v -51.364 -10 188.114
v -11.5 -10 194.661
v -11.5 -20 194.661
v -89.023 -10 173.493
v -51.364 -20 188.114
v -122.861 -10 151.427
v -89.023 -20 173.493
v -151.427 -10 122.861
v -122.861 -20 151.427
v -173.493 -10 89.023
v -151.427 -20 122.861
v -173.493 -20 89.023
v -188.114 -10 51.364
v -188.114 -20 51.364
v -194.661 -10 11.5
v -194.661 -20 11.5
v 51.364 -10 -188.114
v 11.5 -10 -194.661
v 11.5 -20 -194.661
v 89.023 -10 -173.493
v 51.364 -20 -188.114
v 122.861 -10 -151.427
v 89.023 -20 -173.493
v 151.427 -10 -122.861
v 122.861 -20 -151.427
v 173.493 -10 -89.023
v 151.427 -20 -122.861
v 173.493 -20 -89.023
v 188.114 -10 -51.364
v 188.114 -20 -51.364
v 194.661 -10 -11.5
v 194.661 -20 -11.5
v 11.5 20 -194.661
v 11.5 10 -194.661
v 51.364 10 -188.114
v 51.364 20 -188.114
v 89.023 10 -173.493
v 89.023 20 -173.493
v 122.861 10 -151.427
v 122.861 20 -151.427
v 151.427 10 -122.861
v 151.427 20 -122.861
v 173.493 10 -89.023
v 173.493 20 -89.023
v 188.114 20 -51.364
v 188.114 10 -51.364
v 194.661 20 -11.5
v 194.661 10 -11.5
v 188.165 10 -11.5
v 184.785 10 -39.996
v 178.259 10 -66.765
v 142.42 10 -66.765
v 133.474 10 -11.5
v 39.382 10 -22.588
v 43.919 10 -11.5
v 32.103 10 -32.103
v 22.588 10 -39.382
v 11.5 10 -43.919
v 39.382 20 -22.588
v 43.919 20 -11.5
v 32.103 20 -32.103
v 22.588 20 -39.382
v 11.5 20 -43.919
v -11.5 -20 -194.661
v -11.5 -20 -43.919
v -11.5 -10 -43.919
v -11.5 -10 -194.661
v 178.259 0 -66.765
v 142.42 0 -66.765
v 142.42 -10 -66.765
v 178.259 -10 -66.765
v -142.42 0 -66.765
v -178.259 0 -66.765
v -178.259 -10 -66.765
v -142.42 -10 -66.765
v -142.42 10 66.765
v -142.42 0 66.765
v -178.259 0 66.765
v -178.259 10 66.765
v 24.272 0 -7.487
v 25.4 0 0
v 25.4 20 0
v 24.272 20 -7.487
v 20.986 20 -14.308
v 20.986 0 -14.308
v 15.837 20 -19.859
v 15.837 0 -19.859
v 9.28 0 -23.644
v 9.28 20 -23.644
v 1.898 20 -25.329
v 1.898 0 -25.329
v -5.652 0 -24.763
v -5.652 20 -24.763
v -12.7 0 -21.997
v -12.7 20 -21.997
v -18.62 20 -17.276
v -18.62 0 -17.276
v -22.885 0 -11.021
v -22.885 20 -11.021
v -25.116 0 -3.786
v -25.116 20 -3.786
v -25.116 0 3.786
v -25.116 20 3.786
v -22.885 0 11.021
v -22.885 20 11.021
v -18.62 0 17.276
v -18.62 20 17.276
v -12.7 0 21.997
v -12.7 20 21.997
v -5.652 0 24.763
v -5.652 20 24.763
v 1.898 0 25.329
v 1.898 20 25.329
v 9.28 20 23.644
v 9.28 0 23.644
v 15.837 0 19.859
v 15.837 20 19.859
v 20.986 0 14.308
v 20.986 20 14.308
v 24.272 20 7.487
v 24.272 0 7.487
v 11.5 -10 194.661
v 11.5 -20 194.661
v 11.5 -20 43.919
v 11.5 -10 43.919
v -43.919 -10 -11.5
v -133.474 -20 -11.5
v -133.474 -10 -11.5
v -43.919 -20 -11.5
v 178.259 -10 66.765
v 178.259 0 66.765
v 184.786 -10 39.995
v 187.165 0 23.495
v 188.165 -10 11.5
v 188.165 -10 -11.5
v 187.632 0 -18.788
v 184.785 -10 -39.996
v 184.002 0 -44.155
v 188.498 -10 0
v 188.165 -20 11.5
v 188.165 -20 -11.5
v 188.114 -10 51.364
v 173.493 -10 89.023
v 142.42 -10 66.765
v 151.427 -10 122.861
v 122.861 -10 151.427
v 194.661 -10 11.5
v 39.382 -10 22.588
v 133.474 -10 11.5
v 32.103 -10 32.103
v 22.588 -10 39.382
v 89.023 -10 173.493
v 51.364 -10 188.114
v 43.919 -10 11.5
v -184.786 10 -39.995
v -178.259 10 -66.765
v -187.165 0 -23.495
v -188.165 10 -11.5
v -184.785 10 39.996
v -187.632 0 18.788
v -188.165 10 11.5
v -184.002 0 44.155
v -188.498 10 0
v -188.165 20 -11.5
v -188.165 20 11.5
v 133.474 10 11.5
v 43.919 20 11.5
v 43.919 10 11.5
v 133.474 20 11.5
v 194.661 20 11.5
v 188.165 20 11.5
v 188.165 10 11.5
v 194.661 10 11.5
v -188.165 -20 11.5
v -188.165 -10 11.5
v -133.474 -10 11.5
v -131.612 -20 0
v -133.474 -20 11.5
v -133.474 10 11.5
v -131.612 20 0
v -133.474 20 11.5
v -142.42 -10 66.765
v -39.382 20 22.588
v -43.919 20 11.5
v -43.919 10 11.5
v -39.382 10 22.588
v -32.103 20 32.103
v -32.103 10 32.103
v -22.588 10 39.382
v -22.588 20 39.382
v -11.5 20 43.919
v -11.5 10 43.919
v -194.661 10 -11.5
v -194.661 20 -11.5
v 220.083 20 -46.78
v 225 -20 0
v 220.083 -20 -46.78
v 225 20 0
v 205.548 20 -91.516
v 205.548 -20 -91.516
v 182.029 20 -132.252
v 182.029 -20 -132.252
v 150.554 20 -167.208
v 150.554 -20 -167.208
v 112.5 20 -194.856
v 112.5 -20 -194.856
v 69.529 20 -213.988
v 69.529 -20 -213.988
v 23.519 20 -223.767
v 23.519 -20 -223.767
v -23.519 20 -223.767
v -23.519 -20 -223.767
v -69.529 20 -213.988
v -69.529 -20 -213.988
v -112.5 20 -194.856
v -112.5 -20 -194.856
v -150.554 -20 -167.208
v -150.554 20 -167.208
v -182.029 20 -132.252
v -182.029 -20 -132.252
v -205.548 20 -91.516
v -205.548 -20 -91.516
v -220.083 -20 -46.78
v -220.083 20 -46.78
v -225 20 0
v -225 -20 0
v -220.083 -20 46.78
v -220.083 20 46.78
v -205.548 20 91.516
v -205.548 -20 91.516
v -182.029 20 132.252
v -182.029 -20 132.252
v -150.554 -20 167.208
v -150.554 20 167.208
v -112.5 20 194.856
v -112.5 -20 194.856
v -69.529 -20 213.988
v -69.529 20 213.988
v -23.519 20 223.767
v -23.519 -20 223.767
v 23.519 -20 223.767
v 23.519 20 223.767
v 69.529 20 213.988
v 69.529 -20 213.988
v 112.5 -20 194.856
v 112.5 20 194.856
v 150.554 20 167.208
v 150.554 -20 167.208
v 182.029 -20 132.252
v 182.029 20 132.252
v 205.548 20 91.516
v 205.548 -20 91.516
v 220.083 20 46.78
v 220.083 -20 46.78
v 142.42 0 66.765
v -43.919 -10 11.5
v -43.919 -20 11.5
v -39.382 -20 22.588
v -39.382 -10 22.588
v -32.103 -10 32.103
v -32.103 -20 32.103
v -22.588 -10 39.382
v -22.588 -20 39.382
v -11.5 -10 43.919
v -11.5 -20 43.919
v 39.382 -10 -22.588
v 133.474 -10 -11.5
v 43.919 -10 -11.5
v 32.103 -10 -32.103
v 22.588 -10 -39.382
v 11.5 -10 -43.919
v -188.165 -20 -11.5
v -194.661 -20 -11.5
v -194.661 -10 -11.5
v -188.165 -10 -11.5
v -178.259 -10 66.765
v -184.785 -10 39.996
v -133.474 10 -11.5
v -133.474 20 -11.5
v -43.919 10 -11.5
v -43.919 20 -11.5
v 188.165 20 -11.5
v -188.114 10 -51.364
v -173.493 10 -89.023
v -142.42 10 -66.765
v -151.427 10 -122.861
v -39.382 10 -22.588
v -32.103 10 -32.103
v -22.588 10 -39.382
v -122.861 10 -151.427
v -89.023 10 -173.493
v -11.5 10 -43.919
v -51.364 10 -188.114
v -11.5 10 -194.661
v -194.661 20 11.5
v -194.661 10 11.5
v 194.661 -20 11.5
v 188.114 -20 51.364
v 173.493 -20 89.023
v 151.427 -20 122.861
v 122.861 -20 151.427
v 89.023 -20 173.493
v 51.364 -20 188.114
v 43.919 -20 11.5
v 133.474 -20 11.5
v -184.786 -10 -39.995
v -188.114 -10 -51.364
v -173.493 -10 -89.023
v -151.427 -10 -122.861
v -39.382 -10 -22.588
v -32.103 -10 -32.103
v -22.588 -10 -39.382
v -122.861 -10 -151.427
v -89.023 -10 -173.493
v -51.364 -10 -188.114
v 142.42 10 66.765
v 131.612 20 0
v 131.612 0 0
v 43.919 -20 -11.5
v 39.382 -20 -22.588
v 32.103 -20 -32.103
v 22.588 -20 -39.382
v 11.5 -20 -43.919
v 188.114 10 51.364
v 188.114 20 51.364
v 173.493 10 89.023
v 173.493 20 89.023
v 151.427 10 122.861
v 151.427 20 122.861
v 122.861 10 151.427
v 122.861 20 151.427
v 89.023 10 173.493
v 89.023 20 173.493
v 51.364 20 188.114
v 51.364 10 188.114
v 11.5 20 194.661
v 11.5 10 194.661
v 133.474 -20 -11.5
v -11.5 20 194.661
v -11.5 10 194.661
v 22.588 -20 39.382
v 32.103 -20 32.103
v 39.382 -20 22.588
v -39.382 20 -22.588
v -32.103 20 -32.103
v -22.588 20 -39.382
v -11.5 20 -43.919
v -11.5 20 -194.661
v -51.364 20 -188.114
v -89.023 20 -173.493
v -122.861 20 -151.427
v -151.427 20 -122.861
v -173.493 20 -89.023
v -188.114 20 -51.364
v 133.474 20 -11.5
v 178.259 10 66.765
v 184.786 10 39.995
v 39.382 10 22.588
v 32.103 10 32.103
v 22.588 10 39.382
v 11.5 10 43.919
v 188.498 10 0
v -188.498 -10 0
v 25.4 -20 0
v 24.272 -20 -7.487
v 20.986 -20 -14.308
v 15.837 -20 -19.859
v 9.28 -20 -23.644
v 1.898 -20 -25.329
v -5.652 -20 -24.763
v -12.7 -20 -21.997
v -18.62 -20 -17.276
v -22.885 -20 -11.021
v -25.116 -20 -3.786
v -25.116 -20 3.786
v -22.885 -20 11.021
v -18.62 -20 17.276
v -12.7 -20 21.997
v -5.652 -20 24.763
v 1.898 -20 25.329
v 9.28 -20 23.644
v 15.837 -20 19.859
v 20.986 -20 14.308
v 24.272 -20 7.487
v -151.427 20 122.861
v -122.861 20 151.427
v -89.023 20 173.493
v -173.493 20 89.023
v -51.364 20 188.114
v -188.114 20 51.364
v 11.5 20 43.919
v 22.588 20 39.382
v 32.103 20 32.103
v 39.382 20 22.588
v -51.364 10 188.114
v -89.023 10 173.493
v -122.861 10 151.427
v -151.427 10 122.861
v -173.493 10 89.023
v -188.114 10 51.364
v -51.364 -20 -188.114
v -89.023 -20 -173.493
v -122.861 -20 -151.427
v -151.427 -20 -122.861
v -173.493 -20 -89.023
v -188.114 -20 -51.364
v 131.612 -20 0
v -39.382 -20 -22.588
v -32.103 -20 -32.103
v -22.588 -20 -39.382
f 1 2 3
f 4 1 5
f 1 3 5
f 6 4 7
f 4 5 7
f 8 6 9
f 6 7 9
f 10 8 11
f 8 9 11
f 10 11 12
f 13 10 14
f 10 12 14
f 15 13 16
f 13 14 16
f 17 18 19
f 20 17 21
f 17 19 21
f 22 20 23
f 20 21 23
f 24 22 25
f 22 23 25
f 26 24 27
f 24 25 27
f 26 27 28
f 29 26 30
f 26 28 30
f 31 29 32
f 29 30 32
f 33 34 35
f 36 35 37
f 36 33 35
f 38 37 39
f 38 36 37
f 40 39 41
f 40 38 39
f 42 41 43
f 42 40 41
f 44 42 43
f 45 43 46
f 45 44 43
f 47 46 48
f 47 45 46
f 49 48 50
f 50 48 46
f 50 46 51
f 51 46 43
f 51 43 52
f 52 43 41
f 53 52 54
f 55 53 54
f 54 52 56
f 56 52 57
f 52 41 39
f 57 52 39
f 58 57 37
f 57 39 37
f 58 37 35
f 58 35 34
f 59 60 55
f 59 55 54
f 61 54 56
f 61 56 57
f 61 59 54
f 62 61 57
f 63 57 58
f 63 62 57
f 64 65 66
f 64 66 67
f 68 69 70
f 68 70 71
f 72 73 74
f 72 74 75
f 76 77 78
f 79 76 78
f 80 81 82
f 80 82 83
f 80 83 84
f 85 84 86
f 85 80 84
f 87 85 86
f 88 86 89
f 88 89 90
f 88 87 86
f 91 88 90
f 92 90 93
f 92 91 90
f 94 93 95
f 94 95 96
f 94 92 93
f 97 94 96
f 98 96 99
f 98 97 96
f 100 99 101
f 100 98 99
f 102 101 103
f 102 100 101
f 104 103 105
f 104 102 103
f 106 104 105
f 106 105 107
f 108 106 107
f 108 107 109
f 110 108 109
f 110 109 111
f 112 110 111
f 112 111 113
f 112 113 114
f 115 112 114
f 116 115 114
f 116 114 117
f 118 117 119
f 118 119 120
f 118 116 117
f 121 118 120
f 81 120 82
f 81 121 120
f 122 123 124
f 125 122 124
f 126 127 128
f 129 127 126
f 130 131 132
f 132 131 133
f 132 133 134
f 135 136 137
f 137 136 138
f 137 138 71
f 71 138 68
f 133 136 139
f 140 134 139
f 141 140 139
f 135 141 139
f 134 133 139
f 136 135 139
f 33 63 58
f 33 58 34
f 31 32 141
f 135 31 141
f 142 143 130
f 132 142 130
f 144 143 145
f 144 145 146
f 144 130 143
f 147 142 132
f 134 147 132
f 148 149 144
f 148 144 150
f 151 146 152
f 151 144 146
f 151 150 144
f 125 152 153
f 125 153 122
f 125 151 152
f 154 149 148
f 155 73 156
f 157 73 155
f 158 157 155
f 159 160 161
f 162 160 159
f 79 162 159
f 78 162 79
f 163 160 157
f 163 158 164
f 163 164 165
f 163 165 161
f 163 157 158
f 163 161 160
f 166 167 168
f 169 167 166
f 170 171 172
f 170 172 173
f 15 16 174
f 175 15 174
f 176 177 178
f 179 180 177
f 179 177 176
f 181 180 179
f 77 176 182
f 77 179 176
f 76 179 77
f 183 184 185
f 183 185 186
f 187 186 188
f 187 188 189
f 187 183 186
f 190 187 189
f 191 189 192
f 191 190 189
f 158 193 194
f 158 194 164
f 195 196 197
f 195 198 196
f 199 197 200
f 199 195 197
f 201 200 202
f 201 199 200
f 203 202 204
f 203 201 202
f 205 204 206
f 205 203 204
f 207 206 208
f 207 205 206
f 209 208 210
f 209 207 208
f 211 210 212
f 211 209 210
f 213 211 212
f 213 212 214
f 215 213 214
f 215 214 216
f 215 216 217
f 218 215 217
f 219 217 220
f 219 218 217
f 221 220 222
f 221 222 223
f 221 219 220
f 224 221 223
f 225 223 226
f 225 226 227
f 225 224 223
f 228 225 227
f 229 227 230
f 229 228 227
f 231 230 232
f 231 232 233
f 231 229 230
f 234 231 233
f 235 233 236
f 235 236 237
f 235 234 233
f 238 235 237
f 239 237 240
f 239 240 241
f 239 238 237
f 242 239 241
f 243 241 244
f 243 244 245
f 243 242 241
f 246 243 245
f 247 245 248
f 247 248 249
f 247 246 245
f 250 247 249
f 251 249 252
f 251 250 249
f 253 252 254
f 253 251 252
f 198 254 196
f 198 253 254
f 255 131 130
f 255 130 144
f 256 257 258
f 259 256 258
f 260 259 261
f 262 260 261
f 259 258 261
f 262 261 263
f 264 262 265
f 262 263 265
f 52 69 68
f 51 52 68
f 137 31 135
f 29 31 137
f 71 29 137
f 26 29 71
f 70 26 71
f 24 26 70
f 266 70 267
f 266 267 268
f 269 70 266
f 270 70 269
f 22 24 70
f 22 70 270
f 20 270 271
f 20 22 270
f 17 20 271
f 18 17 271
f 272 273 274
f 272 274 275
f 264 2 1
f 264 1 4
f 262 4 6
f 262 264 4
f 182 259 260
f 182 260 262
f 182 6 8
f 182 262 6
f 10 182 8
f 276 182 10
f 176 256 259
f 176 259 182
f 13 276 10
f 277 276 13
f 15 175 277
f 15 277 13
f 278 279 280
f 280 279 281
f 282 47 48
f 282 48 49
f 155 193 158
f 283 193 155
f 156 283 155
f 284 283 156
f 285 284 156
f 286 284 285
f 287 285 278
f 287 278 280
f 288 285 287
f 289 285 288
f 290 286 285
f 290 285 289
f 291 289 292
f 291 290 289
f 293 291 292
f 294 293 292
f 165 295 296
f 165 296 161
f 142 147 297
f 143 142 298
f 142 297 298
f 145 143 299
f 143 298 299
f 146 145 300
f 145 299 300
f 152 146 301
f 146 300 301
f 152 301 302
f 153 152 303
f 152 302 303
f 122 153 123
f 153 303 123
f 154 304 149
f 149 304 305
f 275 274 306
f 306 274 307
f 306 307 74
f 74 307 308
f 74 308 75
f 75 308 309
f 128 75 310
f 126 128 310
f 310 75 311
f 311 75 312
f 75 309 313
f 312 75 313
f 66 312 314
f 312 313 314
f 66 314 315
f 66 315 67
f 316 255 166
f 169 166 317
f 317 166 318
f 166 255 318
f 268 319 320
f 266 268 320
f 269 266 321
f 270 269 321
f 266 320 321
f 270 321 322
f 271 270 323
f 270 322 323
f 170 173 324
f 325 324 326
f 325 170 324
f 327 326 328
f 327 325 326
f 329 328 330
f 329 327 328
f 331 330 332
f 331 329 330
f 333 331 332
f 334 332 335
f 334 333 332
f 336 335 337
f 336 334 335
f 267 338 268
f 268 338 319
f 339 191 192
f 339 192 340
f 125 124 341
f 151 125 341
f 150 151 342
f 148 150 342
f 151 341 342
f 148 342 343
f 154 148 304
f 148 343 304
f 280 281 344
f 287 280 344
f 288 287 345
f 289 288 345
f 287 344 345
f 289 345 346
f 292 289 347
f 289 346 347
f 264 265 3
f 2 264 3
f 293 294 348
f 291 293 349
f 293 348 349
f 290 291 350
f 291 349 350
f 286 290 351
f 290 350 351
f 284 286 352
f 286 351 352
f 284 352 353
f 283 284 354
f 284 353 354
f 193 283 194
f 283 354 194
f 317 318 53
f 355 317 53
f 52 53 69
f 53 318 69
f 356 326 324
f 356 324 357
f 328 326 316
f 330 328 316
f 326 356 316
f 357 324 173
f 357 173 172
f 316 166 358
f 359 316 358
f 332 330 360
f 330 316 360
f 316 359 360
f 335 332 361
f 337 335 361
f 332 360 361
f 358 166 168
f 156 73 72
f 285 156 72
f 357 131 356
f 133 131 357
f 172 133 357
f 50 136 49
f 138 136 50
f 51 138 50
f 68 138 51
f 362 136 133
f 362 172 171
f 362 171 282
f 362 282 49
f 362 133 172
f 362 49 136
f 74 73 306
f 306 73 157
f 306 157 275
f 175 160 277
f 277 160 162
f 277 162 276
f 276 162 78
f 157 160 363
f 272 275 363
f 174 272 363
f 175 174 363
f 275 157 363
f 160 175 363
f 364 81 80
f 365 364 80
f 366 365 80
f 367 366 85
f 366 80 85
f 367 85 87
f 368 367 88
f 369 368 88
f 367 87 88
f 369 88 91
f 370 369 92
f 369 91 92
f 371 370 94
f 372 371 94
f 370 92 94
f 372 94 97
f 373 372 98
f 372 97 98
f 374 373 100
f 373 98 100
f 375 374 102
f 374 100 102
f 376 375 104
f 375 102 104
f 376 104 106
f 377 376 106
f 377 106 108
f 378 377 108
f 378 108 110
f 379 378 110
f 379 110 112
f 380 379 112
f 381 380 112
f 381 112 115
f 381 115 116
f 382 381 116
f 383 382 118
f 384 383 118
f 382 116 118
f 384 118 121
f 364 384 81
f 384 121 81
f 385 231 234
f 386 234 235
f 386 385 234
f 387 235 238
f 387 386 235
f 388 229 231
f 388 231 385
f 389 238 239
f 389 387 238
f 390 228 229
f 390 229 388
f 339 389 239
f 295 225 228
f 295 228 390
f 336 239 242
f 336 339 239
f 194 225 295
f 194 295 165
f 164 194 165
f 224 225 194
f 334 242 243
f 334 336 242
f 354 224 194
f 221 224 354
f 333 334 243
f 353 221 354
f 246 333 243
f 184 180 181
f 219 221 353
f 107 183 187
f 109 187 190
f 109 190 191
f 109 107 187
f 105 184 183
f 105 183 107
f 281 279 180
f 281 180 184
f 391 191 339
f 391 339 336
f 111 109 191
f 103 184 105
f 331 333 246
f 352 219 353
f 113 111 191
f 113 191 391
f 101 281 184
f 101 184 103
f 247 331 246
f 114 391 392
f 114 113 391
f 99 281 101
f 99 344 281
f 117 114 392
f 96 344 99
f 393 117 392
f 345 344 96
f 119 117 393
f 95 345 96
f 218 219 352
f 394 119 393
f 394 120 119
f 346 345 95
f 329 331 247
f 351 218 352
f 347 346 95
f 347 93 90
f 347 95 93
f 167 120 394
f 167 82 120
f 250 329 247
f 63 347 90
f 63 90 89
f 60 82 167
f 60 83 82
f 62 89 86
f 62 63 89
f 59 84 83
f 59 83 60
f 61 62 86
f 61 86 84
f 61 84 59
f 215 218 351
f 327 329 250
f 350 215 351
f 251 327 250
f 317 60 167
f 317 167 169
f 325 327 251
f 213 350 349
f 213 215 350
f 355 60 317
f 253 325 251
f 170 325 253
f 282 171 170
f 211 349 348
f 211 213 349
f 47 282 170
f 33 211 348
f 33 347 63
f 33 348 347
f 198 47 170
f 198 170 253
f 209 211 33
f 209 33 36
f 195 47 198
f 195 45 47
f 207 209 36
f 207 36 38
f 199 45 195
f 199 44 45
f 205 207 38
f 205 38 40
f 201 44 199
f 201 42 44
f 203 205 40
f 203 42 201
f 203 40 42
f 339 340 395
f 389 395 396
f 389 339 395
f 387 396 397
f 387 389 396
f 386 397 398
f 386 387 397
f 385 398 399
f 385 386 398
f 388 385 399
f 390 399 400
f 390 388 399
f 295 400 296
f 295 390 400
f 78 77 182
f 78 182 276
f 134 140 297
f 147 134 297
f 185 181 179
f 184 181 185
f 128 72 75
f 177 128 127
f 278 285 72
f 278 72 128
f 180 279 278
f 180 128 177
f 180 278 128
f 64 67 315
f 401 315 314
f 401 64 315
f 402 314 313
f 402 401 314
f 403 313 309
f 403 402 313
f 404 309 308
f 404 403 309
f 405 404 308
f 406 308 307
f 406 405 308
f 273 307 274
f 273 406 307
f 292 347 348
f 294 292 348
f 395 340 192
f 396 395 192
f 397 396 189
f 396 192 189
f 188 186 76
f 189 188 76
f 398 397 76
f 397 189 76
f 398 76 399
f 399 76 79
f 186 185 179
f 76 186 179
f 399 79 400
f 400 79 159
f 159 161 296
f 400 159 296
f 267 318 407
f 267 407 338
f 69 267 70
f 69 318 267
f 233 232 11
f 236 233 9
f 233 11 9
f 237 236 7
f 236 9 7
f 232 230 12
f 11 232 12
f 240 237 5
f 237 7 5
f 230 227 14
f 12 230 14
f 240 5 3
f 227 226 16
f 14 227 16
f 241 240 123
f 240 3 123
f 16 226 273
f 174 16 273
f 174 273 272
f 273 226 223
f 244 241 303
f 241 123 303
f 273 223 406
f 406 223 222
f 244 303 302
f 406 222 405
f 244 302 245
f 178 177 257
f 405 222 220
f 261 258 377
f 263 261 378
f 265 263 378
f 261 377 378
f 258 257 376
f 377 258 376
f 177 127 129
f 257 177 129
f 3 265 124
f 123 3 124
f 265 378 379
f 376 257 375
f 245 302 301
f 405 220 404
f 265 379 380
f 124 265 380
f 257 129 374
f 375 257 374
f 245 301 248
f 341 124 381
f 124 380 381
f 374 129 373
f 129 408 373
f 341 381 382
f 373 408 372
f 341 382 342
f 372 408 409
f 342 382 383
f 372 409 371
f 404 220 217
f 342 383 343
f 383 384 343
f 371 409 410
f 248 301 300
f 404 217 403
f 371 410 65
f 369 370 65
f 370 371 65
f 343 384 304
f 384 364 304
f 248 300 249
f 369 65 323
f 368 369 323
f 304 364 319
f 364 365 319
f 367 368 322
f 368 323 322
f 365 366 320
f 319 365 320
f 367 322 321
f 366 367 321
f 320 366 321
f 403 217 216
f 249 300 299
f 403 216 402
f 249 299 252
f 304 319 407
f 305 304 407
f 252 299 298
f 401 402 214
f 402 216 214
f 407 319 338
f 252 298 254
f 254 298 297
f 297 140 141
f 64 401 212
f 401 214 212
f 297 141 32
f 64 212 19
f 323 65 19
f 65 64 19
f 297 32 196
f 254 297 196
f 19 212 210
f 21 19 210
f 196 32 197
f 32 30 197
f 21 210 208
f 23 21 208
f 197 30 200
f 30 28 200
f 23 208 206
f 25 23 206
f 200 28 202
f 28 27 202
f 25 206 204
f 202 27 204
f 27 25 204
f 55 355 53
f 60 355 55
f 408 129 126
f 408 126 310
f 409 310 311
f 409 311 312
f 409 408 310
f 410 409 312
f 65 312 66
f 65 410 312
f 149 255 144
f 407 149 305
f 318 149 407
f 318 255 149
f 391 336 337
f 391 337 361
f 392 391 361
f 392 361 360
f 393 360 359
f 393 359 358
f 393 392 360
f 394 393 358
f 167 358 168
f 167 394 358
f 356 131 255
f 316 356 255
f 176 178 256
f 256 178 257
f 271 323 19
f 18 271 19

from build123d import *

# Parameters (mm, degrees)
SKETCH1_R               = 225
SKETCH1_R_2             = 25.4
BOSS_EXTRUDE1_DEPTH     = 20
CUT_EXTRUDE1_DEPTH      = 21
CUT_EXTRUDE1_DEPTH_BACK = 1
CUT_EXTRUDE2_START      = 20
CUT_EXTRUDE2_DEPTH      = 10


with BuildPart() as part:
    # Sketch1 → Boss-Extrude1 (new body)
    with BuildSketch(Plane(origin=(0, 0, 0), x_dir=(1, 0, 0), z_dir=(0, 1, 0))):
        Circle(SKETCH1_R)
        Circle(SKETCH1_R_2, mode=Mode.SUBTRACT)
    extrude(amount=BOSS_EXTRUDE1_DEPTH)

    # Sketch2 → Cut-Extrude1 (cut, two sides)
    with BuildSketch(Plane(origin=(0, 0, 0), x_dir=(1, 0, 0), z_dir=(0, 1, 0))) as cut_extrude1_sk:
        with BuildLine():
            Line((-178.258542487, 66.764776795), (-142.42023427, 66.764776795))
            Line((-142.42023427, 66.764776795), (-131.611855601, 0))
            Line((-131.611855601, 0), (-142.42023427, -66.764776795))
            Line((-142.42023427, -66.764776795), (-178.258542487, -66.764776795))
            add(Edge.make_bspline(
                [(-188.498059121, 0), (-188.498059121, -23.199214205), (-184.204279862, -48.203238876), (-178.258542487, -66.764776795)],
                knots=[0, 0, 0, 0, 1, 1, 1, 1], degree=3))
            add(Edge.make_bspline(
                [(-188.498059121, 0), (-188.498059121, 23.199214205), (-184.204279862, 48.203238876), (-178.258542487, 66.764776795)],
                knots=[0, 0, 0, 0, 1, 1, 1, 1], degree=3))
        make_face()
        with BuildLine():
            Line((178.258542487, -66.764776795), (142.42023427, -66.764776795))
            Line((142.42023427, -66.764776795), (131.611855601, 0))
            Line((131.611855601, 0), (142.42023427, 66.764776795))
            Line((142.42023427, 66.764776795), (178.258542487, 66.764776795))
            add(Edge.make_bspline(
                [(188.498059121, 0), (188.498059121, 23.199214205), (184.204279862, 48.203238876), (178.258542487, 66.764776795)],
                knots=[0, 0, 0, 0, 1, 1, 1, 1], degree=3))
            add(Edge.make_bspline(
                [(188.498059121, 0), (188.498059121, -23.199214205), (184.204279862, -48.203238876), (178.258542487, -66.764776795)],
                knots=[0, 0, 0, 0, 1, 1, 1, 1], degree=3))
        make_face()
    extrude(amount=CUT_EXTRUDE1_DEPTH, mode=Mode.SUBTRACT)
    extrude(cut_extrude1_sk.sketch, amount=-CUT_EXTRUDE1_DEPTH_BACK, mode=Mode.SUBTRACT)

    # Sketch3 → Cut-Extrude2 (cut)
    with BuildSketch(Plane(origin=(0, 0, 0), x_dir=(1, 0, 0), z_dir=(0, 1, 0)).offset(CUT_EXTRUDE2_START)):
        with BuildLine():
            Line((-11.5, 43.919357919), (-11.5, 194.660602074))
            ThreePointArc((-11.5, 194.660602074), (-137.885822331, 137.885822331), (-194.660602074, 11.5))
            Line((-194.660602074, 11.5), (-43.919357919, 11.5))
            ThreePointArc((-43.919357919, 11.5), (-32.102647866, 32.102647866), (-11.5, 43.919357919))
        make_face()
        with BuildLine():
            Line((11.5, 43.919357919), (11.5, 194.660602074))
            ThreePointArc((11.5, 194.660602074), (137.885822331, 137.885822331), (194.660602074, 11.5))
            Line((194.660602074, 11.5), (43.919357919, 11.5))
            ThreePointArc((43.919357919, 11.5), (32.102647866, 32.102647866), (11.5, 43.919357919))
        make_face()
        with BuildLine():
            Line((43.919357919, -11.5), (194.660602074, -11.5))
            ThreePointArc((194.660602074, -11.5), (137.885822331, -137.885822331), (11.5, -194.660602074))
            Line((11.5, -194.660602074), (11.5, -43.919357919))
            ThreePointArc((11.5, -43.919357919), (32.102647866, -32.102647866), (43.919357919, -11.5))
        make_face()
        with BuildLine():
            Line((-11.5, -43.919357919), (-11.5, -194.660602074))
            ThreePointArc((-11.5, -194.660602074), (-137.885822331, -137.885822331), (-194.660602074, -11.5))
            Line((-194.660602074, -11.5), (-43.919357919, -11.5))
            ThreePointArc((-43.919357919, -11.5), (-32.102647866, -32.102647866), (-11.5, -43.919357919))
        make_face()
    extrude(amount=-CUT_EXTRUDE2_DEPTH, mode=Mode.SUBTRACT)

    # Mirror2: part across plane


with BuildPart() as part_1:
    add(part.part)
    add(part.part.mirror(Plane.ZX))


solid = part_1.part
